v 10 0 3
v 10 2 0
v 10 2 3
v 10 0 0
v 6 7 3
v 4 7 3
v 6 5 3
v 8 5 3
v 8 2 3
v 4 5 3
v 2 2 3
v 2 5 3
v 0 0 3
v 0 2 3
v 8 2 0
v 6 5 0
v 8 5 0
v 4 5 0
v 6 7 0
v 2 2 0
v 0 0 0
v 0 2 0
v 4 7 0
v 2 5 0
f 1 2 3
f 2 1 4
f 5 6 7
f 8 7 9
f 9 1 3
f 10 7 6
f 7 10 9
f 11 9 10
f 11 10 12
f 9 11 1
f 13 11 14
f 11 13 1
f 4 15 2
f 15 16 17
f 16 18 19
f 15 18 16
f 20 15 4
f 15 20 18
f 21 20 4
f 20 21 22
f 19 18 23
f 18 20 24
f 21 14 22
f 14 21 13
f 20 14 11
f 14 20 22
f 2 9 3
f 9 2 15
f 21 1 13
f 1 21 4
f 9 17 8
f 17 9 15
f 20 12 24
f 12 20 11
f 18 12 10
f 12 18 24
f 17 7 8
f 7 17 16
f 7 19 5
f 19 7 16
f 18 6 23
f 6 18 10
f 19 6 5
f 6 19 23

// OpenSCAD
//Question 1
color("#8B8000"){
    cube([10, 2, 3]);
    translate([2, 2, 0])
        cube([6, 3, 3]);
    translate([4, 5, 0])
        cube([2, 2, 3]);
    }
